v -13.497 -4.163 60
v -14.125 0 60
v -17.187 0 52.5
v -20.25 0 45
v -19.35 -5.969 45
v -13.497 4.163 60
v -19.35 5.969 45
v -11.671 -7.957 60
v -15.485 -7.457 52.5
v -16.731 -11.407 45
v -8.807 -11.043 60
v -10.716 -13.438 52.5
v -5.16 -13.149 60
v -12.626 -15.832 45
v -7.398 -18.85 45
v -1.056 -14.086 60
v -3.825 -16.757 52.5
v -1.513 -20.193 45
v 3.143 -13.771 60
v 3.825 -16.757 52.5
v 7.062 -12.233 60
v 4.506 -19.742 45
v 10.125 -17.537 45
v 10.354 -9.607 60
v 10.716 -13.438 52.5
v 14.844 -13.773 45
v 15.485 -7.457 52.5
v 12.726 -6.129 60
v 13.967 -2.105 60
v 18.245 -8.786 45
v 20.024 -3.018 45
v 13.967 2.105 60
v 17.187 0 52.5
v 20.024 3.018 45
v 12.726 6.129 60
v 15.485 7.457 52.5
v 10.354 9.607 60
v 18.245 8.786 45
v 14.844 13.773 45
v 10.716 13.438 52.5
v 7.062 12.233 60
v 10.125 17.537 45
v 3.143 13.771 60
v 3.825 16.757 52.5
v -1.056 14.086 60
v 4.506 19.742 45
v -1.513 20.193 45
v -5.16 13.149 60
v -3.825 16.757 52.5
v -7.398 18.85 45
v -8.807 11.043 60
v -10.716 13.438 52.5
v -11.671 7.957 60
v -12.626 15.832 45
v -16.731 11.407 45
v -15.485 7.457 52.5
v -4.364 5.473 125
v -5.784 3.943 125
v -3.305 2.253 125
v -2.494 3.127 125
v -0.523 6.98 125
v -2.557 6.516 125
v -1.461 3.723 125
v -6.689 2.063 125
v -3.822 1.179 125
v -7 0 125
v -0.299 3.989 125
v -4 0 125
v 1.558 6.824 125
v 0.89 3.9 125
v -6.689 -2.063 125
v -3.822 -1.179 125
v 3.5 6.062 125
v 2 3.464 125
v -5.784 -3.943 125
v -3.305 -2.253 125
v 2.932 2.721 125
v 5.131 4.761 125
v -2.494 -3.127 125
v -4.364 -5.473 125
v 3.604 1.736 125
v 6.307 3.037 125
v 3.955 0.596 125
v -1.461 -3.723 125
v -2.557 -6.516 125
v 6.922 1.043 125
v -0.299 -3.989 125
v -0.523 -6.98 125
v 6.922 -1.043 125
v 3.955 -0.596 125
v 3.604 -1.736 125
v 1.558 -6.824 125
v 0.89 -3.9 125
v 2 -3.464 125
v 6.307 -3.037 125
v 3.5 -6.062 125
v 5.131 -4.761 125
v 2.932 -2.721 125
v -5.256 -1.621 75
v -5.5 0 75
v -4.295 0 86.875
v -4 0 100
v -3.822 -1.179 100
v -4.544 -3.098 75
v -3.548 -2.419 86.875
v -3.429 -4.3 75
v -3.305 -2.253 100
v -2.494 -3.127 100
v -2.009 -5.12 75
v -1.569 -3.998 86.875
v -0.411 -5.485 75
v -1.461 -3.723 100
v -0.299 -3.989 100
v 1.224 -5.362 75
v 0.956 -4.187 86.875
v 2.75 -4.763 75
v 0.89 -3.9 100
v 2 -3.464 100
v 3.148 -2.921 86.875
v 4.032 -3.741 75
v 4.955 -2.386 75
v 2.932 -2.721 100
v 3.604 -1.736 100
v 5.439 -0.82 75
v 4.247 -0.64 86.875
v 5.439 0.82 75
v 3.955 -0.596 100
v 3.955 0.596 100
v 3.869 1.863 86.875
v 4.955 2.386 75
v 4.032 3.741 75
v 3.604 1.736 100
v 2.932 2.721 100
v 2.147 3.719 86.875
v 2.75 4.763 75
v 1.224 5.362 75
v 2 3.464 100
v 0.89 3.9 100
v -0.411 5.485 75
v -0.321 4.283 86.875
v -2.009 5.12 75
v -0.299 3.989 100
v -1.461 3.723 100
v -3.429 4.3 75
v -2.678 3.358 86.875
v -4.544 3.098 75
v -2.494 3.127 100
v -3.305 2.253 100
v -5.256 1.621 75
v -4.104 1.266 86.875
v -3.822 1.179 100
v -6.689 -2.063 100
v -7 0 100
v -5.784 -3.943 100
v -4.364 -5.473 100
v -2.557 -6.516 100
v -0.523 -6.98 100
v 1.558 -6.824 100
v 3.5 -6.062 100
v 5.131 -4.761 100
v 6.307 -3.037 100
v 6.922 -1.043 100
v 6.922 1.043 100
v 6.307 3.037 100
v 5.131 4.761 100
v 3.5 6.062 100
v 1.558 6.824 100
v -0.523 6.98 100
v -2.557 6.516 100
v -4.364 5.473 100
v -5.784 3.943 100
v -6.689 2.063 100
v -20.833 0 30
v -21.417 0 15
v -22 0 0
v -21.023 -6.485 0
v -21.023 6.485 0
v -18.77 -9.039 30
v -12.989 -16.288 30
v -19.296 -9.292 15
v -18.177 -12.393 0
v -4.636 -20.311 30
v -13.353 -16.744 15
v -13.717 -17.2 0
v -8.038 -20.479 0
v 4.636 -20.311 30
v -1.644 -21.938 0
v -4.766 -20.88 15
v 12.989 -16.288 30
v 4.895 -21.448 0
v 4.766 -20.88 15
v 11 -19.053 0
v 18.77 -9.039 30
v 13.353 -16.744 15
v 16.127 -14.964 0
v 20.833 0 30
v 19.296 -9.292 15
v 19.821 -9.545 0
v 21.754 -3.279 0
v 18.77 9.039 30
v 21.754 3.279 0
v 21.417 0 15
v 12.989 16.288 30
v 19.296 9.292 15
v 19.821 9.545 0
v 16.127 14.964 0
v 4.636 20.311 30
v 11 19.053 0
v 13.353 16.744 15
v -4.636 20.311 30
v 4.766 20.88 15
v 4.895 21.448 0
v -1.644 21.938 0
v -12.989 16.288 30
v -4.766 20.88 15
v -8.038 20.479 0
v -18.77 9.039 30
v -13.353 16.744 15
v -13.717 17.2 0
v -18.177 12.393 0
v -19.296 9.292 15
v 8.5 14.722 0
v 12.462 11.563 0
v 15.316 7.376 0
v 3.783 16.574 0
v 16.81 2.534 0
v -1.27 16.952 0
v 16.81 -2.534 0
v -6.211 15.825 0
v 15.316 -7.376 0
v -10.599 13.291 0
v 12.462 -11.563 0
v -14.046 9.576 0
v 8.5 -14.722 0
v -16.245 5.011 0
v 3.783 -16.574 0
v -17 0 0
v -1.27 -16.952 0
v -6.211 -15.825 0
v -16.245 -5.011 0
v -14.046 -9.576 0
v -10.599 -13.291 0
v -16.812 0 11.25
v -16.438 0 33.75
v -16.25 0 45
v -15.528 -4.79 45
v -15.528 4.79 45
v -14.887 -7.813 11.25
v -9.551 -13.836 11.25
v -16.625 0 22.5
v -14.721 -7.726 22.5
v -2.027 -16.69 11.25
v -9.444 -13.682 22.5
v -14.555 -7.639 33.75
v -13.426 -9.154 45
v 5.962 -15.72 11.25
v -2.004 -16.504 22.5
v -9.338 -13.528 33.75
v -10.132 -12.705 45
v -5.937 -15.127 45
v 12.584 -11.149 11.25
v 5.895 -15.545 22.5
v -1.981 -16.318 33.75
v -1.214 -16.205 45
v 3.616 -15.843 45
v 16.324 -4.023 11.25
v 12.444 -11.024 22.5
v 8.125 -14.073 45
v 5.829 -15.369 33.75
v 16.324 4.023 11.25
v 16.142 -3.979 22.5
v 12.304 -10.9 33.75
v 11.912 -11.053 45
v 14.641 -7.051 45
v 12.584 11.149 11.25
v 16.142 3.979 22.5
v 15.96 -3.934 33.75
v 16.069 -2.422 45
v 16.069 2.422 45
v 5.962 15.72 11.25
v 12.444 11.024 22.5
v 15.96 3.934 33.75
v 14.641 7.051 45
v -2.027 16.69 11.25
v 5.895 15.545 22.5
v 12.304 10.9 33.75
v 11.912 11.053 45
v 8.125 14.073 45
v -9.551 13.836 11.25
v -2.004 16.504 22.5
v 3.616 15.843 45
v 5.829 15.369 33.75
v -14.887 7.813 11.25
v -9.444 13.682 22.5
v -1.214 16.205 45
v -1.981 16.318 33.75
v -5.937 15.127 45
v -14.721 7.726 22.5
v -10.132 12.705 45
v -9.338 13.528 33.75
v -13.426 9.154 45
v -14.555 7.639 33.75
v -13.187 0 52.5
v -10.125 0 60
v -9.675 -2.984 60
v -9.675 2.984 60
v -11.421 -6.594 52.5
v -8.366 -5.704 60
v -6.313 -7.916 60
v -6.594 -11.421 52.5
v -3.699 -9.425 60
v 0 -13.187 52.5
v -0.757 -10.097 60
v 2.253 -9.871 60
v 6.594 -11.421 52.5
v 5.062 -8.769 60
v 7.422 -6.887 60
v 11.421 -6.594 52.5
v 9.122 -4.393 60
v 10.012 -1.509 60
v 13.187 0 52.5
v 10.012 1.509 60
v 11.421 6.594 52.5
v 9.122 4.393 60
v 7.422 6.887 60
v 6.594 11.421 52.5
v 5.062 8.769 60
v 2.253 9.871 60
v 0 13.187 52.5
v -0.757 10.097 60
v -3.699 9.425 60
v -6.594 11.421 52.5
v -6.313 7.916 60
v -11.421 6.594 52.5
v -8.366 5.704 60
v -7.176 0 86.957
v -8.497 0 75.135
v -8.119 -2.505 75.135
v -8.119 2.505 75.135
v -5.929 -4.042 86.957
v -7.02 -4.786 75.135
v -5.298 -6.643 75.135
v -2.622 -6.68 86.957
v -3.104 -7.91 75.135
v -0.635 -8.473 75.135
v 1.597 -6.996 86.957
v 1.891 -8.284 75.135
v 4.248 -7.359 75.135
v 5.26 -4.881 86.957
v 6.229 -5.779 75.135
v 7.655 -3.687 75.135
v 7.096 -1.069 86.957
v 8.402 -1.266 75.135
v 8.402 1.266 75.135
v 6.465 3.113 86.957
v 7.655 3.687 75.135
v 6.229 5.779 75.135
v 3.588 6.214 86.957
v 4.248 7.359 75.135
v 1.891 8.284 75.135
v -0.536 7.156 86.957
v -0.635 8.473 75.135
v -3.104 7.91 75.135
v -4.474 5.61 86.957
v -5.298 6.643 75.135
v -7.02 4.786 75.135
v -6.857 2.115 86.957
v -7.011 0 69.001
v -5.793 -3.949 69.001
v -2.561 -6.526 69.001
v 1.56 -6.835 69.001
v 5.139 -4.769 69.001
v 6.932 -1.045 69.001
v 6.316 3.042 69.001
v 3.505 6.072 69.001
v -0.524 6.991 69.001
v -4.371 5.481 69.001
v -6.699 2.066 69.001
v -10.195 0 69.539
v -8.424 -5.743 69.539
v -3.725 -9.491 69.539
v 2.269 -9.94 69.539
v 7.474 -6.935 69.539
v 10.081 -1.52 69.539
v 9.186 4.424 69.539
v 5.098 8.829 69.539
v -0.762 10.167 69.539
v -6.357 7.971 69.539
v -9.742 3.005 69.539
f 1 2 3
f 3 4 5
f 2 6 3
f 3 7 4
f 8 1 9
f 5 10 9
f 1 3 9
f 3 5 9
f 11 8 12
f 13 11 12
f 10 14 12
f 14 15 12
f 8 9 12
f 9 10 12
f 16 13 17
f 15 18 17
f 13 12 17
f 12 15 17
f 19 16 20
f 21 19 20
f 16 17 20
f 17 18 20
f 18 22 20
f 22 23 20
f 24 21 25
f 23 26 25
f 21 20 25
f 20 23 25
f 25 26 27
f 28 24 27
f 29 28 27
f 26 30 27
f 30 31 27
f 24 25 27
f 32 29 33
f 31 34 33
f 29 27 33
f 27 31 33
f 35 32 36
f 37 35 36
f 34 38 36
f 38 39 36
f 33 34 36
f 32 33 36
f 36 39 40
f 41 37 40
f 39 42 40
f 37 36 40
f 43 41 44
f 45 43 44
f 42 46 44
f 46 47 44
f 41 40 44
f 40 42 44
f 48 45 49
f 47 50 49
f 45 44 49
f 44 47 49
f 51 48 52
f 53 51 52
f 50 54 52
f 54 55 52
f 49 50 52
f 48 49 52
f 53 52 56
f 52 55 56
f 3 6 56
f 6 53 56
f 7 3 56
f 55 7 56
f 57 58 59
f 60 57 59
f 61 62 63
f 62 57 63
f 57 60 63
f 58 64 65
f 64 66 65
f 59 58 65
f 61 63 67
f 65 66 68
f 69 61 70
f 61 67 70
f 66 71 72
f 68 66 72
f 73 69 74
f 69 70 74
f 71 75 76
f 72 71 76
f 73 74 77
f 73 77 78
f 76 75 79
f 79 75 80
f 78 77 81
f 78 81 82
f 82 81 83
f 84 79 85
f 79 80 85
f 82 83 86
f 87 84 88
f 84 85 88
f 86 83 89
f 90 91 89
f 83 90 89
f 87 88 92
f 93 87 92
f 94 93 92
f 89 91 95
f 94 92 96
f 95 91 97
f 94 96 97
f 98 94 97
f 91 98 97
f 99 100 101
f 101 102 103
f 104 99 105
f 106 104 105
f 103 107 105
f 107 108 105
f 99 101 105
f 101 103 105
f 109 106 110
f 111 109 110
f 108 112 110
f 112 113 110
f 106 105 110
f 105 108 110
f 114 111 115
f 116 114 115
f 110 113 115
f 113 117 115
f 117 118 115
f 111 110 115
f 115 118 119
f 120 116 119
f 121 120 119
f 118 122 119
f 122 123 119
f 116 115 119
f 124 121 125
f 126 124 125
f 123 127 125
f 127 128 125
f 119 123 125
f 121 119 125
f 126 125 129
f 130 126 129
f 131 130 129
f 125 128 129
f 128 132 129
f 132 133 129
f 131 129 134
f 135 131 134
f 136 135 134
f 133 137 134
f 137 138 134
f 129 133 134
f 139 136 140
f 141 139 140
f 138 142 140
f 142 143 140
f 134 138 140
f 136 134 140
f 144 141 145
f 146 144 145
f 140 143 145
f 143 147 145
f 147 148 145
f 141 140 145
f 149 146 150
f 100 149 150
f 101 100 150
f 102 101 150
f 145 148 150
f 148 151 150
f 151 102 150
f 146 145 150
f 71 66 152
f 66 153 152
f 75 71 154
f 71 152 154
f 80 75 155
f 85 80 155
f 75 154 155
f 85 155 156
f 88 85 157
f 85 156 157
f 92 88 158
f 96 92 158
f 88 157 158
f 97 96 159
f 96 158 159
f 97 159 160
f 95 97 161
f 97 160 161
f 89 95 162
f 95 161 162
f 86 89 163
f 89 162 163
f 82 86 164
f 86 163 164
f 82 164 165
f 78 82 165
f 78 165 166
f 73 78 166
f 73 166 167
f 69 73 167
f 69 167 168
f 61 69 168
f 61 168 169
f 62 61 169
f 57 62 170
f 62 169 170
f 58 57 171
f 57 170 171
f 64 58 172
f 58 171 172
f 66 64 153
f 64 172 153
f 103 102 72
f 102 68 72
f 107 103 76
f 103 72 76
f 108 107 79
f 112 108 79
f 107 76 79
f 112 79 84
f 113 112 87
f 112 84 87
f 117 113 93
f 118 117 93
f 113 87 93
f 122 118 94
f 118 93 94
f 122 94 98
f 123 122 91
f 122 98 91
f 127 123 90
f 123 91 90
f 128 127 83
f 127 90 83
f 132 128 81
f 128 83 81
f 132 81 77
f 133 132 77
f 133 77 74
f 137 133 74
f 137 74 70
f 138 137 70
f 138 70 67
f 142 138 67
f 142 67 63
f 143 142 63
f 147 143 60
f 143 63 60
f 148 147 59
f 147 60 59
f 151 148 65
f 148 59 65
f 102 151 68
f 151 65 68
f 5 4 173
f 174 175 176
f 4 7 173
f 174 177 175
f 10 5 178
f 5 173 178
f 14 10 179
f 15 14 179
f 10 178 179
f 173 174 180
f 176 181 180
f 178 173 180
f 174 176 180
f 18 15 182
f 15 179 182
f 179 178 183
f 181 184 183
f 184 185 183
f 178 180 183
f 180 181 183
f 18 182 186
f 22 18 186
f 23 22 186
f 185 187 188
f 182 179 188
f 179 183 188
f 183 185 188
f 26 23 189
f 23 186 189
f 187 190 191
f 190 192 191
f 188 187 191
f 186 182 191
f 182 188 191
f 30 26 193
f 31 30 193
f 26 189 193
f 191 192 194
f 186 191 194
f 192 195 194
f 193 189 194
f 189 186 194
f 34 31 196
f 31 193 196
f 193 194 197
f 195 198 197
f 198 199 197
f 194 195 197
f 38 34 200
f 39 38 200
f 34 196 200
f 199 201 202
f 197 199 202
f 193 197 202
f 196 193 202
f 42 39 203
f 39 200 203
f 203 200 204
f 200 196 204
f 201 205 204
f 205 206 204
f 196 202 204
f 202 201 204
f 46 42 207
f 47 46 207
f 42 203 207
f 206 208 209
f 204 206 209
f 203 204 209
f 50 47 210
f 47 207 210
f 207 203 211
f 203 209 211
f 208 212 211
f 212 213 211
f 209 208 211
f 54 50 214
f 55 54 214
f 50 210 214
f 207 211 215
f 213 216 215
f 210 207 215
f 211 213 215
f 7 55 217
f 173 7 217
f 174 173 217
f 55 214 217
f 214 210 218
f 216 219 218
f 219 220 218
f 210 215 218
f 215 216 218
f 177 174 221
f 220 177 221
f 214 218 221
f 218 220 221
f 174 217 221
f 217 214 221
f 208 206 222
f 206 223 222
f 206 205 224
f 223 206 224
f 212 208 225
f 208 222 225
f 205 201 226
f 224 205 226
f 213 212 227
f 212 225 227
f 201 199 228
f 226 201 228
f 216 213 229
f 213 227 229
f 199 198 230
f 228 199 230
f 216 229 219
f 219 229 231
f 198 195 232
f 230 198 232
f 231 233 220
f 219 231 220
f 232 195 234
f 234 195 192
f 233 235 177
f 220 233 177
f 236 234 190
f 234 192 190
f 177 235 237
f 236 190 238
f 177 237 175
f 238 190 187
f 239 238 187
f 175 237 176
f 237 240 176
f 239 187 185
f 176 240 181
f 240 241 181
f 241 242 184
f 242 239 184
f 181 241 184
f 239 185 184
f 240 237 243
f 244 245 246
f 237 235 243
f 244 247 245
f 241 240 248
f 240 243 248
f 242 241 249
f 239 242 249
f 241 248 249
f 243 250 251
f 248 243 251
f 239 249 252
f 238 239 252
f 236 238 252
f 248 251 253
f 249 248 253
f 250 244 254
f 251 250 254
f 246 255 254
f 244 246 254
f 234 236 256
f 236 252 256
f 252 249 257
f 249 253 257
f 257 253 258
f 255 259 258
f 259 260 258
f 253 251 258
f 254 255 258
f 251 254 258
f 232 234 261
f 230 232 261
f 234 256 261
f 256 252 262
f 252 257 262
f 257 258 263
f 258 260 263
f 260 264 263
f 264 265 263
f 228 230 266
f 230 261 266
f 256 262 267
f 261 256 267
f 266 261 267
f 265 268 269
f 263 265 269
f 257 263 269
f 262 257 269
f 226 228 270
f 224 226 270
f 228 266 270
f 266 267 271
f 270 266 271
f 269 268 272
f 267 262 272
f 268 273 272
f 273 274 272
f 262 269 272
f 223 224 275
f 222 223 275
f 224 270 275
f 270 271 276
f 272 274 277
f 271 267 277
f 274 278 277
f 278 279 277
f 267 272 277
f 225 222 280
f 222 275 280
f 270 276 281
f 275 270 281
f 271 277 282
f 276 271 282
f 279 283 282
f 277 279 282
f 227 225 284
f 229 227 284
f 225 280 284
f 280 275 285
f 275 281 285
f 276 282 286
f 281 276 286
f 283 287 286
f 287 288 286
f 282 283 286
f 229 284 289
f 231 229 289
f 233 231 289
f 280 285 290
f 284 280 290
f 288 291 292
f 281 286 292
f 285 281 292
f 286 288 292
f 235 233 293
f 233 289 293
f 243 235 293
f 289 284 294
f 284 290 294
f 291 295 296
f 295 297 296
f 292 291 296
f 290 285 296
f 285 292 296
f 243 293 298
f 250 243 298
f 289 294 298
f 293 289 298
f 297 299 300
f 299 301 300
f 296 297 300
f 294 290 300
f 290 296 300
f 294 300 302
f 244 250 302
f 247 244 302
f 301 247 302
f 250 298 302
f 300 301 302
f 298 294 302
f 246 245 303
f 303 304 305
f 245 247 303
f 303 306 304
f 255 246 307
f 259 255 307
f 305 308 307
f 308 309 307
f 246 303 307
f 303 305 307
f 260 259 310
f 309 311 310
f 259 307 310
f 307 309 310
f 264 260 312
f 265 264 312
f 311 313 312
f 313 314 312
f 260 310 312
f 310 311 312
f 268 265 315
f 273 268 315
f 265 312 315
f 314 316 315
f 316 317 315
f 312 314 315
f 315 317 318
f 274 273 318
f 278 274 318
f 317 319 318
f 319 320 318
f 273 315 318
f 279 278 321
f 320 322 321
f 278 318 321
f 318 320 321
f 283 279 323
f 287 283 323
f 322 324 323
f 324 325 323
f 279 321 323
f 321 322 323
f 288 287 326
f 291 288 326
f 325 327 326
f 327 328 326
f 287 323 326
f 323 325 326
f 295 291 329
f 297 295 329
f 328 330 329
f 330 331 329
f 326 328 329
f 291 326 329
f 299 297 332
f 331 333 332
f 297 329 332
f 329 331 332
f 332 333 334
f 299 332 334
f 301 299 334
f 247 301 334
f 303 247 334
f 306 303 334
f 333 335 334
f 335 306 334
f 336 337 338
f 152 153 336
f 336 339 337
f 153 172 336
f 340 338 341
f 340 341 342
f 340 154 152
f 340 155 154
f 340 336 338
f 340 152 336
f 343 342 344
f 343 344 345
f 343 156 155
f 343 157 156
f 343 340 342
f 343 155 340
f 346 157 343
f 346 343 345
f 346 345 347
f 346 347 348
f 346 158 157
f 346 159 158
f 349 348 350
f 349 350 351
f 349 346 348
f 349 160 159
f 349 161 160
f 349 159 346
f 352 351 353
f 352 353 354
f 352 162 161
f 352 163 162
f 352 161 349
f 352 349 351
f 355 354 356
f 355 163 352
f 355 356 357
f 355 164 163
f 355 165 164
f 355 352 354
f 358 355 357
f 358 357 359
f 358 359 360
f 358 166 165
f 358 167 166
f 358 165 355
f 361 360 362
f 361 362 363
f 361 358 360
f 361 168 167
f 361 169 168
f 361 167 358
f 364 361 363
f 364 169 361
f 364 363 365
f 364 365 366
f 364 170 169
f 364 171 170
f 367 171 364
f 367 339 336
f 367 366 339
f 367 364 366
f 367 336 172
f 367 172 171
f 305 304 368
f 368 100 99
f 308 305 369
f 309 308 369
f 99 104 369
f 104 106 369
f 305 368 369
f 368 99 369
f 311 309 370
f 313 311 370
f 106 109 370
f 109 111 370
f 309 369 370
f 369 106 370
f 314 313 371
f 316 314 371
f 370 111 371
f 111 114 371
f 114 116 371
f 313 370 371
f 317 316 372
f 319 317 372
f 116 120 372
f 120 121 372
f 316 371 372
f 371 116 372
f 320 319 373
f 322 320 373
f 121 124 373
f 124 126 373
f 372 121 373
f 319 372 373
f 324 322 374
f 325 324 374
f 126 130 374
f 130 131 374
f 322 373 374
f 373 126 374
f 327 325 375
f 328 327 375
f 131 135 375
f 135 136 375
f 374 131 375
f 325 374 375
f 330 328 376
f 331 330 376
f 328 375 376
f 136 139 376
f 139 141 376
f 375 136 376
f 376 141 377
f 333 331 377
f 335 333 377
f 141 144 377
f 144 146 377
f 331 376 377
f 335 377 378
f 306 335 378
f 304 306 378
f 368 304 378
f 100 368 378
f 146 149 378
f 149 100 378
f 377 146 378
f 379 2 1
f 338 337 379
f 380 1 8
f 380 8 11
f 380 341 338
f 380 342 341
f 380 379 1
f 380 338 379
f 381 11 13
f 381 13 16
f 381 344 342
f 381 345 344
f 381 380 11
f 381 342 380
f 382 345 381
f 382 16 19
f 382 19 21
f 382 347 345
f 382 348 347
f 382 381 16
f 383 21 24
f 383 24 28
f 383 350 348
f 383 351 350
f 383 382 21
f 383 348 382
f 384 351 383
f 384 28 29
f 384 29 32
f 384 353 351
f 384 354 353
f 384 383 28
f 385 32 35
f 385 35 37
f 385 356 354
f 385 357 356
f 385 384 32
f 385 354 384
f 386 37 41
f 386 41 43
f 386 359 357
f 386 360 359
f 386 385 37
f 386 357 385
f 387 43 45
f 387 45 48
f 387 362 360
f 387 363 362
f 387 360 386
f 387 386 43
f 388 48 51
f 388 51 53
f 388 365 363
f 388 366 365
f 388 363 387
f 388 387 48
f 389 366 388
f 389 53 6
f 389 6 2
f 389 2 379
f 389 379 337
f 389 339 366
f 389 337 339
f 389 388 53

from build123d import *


with BuildPart() as f1:
    # F0 (on Front) → F1 (revolve)
    with BuildSketch(Plane.XZ):
        Polygon((-22, 0), (-17, 0), (-16.25, 45), (-20.25, 45), align=None)
    revolve(axis=Axis((0, 0, 22.5), (0, 0, 1)))

    # F0 (on Front) → F2 (revolve)
    with BuildSketch(Plane.XZ):
        with BuildLine():
            Line((-20.25, 45), (-16.25, 45))
            Line((-16.25, 45), (-10.1249999976, 59.999902775))
            add(Edge.make_bspline(
                [(-10.1249999976, 59.999902775), (-8.5298389727, 64.666048141), (-6.5813622983, 69.2951174162), (-5.4999999953, 74.9998055501)],
                knots=[0, 0, 0, 0, 0.441861733, 0.441861733, 0.441861733, 0.441861733], degree=3))
            Line((-5.4999999953, 74.9998055501), (-8.4969373337, 75.1353289405))
            add(Edge.make_bspline(
                [(-14.1249999976, 59.999902775), (-12.3183567805, 64.7249967507), (-9.8064455142, 69.3661766921), (-8.4969373337, 75.1353289405)],
                knots=[0, 0, 0, 0, 0.4460290714, 0.4460290714, 0.4460290714, 0.4460290714], degree=3))
            Line((-14.1249999976, 59.999902775), (-20.25, 45))
        make_face()
    revolve(axis=Axis((0, 0, 60), (0, 0, 1)))

    # F0 (on Front) → F3 (revolve)
    with BuildSketch(Plane.XZ):
        with BuildLine():
            Line((-8.4969373337, 75.1353289405), (-5.4999999953, 74.9998055501))
            add(Edge.make_bspline(
                [(-5.4999999953, 74.9998055501), (-4.1340756876, 82.2056903566), (-4.1516769819, 91.1277804046), (-3.9999999953, 99.9998055501)],
                knots=[0.441861733, 0.441861733, 0.441861733, 0.441861733, 1, 1, 1, 1], degree=3))
            Line((-3.9999999953, 99.9998055501), (-3.9999999953, 124.9998055501))
            Line((-3.9999999953, 124.9998055501), (-6.9999999953, 124.9998055501))
            Line((-6.9999999953, 124.9998055501), (-6.9999999953, 99.9998055501))
            add(Edge.make_bspline(
                [(-8.4969373337, 75.1353289405), (-6.8705198887, 82.3006525327), (-7.0989050536, 91.2059633256), (-6.9999999953, 99.9998055501)],
                knots=[0.4460290714, 0.4460290714, 0.4460290714, 0.4460290714, 1, 1, 1, 1], degree=3))
        make_face()
    revolve(axis=Axis((0, 0, 100), (0, 0, 1)))


solid = f1.part
